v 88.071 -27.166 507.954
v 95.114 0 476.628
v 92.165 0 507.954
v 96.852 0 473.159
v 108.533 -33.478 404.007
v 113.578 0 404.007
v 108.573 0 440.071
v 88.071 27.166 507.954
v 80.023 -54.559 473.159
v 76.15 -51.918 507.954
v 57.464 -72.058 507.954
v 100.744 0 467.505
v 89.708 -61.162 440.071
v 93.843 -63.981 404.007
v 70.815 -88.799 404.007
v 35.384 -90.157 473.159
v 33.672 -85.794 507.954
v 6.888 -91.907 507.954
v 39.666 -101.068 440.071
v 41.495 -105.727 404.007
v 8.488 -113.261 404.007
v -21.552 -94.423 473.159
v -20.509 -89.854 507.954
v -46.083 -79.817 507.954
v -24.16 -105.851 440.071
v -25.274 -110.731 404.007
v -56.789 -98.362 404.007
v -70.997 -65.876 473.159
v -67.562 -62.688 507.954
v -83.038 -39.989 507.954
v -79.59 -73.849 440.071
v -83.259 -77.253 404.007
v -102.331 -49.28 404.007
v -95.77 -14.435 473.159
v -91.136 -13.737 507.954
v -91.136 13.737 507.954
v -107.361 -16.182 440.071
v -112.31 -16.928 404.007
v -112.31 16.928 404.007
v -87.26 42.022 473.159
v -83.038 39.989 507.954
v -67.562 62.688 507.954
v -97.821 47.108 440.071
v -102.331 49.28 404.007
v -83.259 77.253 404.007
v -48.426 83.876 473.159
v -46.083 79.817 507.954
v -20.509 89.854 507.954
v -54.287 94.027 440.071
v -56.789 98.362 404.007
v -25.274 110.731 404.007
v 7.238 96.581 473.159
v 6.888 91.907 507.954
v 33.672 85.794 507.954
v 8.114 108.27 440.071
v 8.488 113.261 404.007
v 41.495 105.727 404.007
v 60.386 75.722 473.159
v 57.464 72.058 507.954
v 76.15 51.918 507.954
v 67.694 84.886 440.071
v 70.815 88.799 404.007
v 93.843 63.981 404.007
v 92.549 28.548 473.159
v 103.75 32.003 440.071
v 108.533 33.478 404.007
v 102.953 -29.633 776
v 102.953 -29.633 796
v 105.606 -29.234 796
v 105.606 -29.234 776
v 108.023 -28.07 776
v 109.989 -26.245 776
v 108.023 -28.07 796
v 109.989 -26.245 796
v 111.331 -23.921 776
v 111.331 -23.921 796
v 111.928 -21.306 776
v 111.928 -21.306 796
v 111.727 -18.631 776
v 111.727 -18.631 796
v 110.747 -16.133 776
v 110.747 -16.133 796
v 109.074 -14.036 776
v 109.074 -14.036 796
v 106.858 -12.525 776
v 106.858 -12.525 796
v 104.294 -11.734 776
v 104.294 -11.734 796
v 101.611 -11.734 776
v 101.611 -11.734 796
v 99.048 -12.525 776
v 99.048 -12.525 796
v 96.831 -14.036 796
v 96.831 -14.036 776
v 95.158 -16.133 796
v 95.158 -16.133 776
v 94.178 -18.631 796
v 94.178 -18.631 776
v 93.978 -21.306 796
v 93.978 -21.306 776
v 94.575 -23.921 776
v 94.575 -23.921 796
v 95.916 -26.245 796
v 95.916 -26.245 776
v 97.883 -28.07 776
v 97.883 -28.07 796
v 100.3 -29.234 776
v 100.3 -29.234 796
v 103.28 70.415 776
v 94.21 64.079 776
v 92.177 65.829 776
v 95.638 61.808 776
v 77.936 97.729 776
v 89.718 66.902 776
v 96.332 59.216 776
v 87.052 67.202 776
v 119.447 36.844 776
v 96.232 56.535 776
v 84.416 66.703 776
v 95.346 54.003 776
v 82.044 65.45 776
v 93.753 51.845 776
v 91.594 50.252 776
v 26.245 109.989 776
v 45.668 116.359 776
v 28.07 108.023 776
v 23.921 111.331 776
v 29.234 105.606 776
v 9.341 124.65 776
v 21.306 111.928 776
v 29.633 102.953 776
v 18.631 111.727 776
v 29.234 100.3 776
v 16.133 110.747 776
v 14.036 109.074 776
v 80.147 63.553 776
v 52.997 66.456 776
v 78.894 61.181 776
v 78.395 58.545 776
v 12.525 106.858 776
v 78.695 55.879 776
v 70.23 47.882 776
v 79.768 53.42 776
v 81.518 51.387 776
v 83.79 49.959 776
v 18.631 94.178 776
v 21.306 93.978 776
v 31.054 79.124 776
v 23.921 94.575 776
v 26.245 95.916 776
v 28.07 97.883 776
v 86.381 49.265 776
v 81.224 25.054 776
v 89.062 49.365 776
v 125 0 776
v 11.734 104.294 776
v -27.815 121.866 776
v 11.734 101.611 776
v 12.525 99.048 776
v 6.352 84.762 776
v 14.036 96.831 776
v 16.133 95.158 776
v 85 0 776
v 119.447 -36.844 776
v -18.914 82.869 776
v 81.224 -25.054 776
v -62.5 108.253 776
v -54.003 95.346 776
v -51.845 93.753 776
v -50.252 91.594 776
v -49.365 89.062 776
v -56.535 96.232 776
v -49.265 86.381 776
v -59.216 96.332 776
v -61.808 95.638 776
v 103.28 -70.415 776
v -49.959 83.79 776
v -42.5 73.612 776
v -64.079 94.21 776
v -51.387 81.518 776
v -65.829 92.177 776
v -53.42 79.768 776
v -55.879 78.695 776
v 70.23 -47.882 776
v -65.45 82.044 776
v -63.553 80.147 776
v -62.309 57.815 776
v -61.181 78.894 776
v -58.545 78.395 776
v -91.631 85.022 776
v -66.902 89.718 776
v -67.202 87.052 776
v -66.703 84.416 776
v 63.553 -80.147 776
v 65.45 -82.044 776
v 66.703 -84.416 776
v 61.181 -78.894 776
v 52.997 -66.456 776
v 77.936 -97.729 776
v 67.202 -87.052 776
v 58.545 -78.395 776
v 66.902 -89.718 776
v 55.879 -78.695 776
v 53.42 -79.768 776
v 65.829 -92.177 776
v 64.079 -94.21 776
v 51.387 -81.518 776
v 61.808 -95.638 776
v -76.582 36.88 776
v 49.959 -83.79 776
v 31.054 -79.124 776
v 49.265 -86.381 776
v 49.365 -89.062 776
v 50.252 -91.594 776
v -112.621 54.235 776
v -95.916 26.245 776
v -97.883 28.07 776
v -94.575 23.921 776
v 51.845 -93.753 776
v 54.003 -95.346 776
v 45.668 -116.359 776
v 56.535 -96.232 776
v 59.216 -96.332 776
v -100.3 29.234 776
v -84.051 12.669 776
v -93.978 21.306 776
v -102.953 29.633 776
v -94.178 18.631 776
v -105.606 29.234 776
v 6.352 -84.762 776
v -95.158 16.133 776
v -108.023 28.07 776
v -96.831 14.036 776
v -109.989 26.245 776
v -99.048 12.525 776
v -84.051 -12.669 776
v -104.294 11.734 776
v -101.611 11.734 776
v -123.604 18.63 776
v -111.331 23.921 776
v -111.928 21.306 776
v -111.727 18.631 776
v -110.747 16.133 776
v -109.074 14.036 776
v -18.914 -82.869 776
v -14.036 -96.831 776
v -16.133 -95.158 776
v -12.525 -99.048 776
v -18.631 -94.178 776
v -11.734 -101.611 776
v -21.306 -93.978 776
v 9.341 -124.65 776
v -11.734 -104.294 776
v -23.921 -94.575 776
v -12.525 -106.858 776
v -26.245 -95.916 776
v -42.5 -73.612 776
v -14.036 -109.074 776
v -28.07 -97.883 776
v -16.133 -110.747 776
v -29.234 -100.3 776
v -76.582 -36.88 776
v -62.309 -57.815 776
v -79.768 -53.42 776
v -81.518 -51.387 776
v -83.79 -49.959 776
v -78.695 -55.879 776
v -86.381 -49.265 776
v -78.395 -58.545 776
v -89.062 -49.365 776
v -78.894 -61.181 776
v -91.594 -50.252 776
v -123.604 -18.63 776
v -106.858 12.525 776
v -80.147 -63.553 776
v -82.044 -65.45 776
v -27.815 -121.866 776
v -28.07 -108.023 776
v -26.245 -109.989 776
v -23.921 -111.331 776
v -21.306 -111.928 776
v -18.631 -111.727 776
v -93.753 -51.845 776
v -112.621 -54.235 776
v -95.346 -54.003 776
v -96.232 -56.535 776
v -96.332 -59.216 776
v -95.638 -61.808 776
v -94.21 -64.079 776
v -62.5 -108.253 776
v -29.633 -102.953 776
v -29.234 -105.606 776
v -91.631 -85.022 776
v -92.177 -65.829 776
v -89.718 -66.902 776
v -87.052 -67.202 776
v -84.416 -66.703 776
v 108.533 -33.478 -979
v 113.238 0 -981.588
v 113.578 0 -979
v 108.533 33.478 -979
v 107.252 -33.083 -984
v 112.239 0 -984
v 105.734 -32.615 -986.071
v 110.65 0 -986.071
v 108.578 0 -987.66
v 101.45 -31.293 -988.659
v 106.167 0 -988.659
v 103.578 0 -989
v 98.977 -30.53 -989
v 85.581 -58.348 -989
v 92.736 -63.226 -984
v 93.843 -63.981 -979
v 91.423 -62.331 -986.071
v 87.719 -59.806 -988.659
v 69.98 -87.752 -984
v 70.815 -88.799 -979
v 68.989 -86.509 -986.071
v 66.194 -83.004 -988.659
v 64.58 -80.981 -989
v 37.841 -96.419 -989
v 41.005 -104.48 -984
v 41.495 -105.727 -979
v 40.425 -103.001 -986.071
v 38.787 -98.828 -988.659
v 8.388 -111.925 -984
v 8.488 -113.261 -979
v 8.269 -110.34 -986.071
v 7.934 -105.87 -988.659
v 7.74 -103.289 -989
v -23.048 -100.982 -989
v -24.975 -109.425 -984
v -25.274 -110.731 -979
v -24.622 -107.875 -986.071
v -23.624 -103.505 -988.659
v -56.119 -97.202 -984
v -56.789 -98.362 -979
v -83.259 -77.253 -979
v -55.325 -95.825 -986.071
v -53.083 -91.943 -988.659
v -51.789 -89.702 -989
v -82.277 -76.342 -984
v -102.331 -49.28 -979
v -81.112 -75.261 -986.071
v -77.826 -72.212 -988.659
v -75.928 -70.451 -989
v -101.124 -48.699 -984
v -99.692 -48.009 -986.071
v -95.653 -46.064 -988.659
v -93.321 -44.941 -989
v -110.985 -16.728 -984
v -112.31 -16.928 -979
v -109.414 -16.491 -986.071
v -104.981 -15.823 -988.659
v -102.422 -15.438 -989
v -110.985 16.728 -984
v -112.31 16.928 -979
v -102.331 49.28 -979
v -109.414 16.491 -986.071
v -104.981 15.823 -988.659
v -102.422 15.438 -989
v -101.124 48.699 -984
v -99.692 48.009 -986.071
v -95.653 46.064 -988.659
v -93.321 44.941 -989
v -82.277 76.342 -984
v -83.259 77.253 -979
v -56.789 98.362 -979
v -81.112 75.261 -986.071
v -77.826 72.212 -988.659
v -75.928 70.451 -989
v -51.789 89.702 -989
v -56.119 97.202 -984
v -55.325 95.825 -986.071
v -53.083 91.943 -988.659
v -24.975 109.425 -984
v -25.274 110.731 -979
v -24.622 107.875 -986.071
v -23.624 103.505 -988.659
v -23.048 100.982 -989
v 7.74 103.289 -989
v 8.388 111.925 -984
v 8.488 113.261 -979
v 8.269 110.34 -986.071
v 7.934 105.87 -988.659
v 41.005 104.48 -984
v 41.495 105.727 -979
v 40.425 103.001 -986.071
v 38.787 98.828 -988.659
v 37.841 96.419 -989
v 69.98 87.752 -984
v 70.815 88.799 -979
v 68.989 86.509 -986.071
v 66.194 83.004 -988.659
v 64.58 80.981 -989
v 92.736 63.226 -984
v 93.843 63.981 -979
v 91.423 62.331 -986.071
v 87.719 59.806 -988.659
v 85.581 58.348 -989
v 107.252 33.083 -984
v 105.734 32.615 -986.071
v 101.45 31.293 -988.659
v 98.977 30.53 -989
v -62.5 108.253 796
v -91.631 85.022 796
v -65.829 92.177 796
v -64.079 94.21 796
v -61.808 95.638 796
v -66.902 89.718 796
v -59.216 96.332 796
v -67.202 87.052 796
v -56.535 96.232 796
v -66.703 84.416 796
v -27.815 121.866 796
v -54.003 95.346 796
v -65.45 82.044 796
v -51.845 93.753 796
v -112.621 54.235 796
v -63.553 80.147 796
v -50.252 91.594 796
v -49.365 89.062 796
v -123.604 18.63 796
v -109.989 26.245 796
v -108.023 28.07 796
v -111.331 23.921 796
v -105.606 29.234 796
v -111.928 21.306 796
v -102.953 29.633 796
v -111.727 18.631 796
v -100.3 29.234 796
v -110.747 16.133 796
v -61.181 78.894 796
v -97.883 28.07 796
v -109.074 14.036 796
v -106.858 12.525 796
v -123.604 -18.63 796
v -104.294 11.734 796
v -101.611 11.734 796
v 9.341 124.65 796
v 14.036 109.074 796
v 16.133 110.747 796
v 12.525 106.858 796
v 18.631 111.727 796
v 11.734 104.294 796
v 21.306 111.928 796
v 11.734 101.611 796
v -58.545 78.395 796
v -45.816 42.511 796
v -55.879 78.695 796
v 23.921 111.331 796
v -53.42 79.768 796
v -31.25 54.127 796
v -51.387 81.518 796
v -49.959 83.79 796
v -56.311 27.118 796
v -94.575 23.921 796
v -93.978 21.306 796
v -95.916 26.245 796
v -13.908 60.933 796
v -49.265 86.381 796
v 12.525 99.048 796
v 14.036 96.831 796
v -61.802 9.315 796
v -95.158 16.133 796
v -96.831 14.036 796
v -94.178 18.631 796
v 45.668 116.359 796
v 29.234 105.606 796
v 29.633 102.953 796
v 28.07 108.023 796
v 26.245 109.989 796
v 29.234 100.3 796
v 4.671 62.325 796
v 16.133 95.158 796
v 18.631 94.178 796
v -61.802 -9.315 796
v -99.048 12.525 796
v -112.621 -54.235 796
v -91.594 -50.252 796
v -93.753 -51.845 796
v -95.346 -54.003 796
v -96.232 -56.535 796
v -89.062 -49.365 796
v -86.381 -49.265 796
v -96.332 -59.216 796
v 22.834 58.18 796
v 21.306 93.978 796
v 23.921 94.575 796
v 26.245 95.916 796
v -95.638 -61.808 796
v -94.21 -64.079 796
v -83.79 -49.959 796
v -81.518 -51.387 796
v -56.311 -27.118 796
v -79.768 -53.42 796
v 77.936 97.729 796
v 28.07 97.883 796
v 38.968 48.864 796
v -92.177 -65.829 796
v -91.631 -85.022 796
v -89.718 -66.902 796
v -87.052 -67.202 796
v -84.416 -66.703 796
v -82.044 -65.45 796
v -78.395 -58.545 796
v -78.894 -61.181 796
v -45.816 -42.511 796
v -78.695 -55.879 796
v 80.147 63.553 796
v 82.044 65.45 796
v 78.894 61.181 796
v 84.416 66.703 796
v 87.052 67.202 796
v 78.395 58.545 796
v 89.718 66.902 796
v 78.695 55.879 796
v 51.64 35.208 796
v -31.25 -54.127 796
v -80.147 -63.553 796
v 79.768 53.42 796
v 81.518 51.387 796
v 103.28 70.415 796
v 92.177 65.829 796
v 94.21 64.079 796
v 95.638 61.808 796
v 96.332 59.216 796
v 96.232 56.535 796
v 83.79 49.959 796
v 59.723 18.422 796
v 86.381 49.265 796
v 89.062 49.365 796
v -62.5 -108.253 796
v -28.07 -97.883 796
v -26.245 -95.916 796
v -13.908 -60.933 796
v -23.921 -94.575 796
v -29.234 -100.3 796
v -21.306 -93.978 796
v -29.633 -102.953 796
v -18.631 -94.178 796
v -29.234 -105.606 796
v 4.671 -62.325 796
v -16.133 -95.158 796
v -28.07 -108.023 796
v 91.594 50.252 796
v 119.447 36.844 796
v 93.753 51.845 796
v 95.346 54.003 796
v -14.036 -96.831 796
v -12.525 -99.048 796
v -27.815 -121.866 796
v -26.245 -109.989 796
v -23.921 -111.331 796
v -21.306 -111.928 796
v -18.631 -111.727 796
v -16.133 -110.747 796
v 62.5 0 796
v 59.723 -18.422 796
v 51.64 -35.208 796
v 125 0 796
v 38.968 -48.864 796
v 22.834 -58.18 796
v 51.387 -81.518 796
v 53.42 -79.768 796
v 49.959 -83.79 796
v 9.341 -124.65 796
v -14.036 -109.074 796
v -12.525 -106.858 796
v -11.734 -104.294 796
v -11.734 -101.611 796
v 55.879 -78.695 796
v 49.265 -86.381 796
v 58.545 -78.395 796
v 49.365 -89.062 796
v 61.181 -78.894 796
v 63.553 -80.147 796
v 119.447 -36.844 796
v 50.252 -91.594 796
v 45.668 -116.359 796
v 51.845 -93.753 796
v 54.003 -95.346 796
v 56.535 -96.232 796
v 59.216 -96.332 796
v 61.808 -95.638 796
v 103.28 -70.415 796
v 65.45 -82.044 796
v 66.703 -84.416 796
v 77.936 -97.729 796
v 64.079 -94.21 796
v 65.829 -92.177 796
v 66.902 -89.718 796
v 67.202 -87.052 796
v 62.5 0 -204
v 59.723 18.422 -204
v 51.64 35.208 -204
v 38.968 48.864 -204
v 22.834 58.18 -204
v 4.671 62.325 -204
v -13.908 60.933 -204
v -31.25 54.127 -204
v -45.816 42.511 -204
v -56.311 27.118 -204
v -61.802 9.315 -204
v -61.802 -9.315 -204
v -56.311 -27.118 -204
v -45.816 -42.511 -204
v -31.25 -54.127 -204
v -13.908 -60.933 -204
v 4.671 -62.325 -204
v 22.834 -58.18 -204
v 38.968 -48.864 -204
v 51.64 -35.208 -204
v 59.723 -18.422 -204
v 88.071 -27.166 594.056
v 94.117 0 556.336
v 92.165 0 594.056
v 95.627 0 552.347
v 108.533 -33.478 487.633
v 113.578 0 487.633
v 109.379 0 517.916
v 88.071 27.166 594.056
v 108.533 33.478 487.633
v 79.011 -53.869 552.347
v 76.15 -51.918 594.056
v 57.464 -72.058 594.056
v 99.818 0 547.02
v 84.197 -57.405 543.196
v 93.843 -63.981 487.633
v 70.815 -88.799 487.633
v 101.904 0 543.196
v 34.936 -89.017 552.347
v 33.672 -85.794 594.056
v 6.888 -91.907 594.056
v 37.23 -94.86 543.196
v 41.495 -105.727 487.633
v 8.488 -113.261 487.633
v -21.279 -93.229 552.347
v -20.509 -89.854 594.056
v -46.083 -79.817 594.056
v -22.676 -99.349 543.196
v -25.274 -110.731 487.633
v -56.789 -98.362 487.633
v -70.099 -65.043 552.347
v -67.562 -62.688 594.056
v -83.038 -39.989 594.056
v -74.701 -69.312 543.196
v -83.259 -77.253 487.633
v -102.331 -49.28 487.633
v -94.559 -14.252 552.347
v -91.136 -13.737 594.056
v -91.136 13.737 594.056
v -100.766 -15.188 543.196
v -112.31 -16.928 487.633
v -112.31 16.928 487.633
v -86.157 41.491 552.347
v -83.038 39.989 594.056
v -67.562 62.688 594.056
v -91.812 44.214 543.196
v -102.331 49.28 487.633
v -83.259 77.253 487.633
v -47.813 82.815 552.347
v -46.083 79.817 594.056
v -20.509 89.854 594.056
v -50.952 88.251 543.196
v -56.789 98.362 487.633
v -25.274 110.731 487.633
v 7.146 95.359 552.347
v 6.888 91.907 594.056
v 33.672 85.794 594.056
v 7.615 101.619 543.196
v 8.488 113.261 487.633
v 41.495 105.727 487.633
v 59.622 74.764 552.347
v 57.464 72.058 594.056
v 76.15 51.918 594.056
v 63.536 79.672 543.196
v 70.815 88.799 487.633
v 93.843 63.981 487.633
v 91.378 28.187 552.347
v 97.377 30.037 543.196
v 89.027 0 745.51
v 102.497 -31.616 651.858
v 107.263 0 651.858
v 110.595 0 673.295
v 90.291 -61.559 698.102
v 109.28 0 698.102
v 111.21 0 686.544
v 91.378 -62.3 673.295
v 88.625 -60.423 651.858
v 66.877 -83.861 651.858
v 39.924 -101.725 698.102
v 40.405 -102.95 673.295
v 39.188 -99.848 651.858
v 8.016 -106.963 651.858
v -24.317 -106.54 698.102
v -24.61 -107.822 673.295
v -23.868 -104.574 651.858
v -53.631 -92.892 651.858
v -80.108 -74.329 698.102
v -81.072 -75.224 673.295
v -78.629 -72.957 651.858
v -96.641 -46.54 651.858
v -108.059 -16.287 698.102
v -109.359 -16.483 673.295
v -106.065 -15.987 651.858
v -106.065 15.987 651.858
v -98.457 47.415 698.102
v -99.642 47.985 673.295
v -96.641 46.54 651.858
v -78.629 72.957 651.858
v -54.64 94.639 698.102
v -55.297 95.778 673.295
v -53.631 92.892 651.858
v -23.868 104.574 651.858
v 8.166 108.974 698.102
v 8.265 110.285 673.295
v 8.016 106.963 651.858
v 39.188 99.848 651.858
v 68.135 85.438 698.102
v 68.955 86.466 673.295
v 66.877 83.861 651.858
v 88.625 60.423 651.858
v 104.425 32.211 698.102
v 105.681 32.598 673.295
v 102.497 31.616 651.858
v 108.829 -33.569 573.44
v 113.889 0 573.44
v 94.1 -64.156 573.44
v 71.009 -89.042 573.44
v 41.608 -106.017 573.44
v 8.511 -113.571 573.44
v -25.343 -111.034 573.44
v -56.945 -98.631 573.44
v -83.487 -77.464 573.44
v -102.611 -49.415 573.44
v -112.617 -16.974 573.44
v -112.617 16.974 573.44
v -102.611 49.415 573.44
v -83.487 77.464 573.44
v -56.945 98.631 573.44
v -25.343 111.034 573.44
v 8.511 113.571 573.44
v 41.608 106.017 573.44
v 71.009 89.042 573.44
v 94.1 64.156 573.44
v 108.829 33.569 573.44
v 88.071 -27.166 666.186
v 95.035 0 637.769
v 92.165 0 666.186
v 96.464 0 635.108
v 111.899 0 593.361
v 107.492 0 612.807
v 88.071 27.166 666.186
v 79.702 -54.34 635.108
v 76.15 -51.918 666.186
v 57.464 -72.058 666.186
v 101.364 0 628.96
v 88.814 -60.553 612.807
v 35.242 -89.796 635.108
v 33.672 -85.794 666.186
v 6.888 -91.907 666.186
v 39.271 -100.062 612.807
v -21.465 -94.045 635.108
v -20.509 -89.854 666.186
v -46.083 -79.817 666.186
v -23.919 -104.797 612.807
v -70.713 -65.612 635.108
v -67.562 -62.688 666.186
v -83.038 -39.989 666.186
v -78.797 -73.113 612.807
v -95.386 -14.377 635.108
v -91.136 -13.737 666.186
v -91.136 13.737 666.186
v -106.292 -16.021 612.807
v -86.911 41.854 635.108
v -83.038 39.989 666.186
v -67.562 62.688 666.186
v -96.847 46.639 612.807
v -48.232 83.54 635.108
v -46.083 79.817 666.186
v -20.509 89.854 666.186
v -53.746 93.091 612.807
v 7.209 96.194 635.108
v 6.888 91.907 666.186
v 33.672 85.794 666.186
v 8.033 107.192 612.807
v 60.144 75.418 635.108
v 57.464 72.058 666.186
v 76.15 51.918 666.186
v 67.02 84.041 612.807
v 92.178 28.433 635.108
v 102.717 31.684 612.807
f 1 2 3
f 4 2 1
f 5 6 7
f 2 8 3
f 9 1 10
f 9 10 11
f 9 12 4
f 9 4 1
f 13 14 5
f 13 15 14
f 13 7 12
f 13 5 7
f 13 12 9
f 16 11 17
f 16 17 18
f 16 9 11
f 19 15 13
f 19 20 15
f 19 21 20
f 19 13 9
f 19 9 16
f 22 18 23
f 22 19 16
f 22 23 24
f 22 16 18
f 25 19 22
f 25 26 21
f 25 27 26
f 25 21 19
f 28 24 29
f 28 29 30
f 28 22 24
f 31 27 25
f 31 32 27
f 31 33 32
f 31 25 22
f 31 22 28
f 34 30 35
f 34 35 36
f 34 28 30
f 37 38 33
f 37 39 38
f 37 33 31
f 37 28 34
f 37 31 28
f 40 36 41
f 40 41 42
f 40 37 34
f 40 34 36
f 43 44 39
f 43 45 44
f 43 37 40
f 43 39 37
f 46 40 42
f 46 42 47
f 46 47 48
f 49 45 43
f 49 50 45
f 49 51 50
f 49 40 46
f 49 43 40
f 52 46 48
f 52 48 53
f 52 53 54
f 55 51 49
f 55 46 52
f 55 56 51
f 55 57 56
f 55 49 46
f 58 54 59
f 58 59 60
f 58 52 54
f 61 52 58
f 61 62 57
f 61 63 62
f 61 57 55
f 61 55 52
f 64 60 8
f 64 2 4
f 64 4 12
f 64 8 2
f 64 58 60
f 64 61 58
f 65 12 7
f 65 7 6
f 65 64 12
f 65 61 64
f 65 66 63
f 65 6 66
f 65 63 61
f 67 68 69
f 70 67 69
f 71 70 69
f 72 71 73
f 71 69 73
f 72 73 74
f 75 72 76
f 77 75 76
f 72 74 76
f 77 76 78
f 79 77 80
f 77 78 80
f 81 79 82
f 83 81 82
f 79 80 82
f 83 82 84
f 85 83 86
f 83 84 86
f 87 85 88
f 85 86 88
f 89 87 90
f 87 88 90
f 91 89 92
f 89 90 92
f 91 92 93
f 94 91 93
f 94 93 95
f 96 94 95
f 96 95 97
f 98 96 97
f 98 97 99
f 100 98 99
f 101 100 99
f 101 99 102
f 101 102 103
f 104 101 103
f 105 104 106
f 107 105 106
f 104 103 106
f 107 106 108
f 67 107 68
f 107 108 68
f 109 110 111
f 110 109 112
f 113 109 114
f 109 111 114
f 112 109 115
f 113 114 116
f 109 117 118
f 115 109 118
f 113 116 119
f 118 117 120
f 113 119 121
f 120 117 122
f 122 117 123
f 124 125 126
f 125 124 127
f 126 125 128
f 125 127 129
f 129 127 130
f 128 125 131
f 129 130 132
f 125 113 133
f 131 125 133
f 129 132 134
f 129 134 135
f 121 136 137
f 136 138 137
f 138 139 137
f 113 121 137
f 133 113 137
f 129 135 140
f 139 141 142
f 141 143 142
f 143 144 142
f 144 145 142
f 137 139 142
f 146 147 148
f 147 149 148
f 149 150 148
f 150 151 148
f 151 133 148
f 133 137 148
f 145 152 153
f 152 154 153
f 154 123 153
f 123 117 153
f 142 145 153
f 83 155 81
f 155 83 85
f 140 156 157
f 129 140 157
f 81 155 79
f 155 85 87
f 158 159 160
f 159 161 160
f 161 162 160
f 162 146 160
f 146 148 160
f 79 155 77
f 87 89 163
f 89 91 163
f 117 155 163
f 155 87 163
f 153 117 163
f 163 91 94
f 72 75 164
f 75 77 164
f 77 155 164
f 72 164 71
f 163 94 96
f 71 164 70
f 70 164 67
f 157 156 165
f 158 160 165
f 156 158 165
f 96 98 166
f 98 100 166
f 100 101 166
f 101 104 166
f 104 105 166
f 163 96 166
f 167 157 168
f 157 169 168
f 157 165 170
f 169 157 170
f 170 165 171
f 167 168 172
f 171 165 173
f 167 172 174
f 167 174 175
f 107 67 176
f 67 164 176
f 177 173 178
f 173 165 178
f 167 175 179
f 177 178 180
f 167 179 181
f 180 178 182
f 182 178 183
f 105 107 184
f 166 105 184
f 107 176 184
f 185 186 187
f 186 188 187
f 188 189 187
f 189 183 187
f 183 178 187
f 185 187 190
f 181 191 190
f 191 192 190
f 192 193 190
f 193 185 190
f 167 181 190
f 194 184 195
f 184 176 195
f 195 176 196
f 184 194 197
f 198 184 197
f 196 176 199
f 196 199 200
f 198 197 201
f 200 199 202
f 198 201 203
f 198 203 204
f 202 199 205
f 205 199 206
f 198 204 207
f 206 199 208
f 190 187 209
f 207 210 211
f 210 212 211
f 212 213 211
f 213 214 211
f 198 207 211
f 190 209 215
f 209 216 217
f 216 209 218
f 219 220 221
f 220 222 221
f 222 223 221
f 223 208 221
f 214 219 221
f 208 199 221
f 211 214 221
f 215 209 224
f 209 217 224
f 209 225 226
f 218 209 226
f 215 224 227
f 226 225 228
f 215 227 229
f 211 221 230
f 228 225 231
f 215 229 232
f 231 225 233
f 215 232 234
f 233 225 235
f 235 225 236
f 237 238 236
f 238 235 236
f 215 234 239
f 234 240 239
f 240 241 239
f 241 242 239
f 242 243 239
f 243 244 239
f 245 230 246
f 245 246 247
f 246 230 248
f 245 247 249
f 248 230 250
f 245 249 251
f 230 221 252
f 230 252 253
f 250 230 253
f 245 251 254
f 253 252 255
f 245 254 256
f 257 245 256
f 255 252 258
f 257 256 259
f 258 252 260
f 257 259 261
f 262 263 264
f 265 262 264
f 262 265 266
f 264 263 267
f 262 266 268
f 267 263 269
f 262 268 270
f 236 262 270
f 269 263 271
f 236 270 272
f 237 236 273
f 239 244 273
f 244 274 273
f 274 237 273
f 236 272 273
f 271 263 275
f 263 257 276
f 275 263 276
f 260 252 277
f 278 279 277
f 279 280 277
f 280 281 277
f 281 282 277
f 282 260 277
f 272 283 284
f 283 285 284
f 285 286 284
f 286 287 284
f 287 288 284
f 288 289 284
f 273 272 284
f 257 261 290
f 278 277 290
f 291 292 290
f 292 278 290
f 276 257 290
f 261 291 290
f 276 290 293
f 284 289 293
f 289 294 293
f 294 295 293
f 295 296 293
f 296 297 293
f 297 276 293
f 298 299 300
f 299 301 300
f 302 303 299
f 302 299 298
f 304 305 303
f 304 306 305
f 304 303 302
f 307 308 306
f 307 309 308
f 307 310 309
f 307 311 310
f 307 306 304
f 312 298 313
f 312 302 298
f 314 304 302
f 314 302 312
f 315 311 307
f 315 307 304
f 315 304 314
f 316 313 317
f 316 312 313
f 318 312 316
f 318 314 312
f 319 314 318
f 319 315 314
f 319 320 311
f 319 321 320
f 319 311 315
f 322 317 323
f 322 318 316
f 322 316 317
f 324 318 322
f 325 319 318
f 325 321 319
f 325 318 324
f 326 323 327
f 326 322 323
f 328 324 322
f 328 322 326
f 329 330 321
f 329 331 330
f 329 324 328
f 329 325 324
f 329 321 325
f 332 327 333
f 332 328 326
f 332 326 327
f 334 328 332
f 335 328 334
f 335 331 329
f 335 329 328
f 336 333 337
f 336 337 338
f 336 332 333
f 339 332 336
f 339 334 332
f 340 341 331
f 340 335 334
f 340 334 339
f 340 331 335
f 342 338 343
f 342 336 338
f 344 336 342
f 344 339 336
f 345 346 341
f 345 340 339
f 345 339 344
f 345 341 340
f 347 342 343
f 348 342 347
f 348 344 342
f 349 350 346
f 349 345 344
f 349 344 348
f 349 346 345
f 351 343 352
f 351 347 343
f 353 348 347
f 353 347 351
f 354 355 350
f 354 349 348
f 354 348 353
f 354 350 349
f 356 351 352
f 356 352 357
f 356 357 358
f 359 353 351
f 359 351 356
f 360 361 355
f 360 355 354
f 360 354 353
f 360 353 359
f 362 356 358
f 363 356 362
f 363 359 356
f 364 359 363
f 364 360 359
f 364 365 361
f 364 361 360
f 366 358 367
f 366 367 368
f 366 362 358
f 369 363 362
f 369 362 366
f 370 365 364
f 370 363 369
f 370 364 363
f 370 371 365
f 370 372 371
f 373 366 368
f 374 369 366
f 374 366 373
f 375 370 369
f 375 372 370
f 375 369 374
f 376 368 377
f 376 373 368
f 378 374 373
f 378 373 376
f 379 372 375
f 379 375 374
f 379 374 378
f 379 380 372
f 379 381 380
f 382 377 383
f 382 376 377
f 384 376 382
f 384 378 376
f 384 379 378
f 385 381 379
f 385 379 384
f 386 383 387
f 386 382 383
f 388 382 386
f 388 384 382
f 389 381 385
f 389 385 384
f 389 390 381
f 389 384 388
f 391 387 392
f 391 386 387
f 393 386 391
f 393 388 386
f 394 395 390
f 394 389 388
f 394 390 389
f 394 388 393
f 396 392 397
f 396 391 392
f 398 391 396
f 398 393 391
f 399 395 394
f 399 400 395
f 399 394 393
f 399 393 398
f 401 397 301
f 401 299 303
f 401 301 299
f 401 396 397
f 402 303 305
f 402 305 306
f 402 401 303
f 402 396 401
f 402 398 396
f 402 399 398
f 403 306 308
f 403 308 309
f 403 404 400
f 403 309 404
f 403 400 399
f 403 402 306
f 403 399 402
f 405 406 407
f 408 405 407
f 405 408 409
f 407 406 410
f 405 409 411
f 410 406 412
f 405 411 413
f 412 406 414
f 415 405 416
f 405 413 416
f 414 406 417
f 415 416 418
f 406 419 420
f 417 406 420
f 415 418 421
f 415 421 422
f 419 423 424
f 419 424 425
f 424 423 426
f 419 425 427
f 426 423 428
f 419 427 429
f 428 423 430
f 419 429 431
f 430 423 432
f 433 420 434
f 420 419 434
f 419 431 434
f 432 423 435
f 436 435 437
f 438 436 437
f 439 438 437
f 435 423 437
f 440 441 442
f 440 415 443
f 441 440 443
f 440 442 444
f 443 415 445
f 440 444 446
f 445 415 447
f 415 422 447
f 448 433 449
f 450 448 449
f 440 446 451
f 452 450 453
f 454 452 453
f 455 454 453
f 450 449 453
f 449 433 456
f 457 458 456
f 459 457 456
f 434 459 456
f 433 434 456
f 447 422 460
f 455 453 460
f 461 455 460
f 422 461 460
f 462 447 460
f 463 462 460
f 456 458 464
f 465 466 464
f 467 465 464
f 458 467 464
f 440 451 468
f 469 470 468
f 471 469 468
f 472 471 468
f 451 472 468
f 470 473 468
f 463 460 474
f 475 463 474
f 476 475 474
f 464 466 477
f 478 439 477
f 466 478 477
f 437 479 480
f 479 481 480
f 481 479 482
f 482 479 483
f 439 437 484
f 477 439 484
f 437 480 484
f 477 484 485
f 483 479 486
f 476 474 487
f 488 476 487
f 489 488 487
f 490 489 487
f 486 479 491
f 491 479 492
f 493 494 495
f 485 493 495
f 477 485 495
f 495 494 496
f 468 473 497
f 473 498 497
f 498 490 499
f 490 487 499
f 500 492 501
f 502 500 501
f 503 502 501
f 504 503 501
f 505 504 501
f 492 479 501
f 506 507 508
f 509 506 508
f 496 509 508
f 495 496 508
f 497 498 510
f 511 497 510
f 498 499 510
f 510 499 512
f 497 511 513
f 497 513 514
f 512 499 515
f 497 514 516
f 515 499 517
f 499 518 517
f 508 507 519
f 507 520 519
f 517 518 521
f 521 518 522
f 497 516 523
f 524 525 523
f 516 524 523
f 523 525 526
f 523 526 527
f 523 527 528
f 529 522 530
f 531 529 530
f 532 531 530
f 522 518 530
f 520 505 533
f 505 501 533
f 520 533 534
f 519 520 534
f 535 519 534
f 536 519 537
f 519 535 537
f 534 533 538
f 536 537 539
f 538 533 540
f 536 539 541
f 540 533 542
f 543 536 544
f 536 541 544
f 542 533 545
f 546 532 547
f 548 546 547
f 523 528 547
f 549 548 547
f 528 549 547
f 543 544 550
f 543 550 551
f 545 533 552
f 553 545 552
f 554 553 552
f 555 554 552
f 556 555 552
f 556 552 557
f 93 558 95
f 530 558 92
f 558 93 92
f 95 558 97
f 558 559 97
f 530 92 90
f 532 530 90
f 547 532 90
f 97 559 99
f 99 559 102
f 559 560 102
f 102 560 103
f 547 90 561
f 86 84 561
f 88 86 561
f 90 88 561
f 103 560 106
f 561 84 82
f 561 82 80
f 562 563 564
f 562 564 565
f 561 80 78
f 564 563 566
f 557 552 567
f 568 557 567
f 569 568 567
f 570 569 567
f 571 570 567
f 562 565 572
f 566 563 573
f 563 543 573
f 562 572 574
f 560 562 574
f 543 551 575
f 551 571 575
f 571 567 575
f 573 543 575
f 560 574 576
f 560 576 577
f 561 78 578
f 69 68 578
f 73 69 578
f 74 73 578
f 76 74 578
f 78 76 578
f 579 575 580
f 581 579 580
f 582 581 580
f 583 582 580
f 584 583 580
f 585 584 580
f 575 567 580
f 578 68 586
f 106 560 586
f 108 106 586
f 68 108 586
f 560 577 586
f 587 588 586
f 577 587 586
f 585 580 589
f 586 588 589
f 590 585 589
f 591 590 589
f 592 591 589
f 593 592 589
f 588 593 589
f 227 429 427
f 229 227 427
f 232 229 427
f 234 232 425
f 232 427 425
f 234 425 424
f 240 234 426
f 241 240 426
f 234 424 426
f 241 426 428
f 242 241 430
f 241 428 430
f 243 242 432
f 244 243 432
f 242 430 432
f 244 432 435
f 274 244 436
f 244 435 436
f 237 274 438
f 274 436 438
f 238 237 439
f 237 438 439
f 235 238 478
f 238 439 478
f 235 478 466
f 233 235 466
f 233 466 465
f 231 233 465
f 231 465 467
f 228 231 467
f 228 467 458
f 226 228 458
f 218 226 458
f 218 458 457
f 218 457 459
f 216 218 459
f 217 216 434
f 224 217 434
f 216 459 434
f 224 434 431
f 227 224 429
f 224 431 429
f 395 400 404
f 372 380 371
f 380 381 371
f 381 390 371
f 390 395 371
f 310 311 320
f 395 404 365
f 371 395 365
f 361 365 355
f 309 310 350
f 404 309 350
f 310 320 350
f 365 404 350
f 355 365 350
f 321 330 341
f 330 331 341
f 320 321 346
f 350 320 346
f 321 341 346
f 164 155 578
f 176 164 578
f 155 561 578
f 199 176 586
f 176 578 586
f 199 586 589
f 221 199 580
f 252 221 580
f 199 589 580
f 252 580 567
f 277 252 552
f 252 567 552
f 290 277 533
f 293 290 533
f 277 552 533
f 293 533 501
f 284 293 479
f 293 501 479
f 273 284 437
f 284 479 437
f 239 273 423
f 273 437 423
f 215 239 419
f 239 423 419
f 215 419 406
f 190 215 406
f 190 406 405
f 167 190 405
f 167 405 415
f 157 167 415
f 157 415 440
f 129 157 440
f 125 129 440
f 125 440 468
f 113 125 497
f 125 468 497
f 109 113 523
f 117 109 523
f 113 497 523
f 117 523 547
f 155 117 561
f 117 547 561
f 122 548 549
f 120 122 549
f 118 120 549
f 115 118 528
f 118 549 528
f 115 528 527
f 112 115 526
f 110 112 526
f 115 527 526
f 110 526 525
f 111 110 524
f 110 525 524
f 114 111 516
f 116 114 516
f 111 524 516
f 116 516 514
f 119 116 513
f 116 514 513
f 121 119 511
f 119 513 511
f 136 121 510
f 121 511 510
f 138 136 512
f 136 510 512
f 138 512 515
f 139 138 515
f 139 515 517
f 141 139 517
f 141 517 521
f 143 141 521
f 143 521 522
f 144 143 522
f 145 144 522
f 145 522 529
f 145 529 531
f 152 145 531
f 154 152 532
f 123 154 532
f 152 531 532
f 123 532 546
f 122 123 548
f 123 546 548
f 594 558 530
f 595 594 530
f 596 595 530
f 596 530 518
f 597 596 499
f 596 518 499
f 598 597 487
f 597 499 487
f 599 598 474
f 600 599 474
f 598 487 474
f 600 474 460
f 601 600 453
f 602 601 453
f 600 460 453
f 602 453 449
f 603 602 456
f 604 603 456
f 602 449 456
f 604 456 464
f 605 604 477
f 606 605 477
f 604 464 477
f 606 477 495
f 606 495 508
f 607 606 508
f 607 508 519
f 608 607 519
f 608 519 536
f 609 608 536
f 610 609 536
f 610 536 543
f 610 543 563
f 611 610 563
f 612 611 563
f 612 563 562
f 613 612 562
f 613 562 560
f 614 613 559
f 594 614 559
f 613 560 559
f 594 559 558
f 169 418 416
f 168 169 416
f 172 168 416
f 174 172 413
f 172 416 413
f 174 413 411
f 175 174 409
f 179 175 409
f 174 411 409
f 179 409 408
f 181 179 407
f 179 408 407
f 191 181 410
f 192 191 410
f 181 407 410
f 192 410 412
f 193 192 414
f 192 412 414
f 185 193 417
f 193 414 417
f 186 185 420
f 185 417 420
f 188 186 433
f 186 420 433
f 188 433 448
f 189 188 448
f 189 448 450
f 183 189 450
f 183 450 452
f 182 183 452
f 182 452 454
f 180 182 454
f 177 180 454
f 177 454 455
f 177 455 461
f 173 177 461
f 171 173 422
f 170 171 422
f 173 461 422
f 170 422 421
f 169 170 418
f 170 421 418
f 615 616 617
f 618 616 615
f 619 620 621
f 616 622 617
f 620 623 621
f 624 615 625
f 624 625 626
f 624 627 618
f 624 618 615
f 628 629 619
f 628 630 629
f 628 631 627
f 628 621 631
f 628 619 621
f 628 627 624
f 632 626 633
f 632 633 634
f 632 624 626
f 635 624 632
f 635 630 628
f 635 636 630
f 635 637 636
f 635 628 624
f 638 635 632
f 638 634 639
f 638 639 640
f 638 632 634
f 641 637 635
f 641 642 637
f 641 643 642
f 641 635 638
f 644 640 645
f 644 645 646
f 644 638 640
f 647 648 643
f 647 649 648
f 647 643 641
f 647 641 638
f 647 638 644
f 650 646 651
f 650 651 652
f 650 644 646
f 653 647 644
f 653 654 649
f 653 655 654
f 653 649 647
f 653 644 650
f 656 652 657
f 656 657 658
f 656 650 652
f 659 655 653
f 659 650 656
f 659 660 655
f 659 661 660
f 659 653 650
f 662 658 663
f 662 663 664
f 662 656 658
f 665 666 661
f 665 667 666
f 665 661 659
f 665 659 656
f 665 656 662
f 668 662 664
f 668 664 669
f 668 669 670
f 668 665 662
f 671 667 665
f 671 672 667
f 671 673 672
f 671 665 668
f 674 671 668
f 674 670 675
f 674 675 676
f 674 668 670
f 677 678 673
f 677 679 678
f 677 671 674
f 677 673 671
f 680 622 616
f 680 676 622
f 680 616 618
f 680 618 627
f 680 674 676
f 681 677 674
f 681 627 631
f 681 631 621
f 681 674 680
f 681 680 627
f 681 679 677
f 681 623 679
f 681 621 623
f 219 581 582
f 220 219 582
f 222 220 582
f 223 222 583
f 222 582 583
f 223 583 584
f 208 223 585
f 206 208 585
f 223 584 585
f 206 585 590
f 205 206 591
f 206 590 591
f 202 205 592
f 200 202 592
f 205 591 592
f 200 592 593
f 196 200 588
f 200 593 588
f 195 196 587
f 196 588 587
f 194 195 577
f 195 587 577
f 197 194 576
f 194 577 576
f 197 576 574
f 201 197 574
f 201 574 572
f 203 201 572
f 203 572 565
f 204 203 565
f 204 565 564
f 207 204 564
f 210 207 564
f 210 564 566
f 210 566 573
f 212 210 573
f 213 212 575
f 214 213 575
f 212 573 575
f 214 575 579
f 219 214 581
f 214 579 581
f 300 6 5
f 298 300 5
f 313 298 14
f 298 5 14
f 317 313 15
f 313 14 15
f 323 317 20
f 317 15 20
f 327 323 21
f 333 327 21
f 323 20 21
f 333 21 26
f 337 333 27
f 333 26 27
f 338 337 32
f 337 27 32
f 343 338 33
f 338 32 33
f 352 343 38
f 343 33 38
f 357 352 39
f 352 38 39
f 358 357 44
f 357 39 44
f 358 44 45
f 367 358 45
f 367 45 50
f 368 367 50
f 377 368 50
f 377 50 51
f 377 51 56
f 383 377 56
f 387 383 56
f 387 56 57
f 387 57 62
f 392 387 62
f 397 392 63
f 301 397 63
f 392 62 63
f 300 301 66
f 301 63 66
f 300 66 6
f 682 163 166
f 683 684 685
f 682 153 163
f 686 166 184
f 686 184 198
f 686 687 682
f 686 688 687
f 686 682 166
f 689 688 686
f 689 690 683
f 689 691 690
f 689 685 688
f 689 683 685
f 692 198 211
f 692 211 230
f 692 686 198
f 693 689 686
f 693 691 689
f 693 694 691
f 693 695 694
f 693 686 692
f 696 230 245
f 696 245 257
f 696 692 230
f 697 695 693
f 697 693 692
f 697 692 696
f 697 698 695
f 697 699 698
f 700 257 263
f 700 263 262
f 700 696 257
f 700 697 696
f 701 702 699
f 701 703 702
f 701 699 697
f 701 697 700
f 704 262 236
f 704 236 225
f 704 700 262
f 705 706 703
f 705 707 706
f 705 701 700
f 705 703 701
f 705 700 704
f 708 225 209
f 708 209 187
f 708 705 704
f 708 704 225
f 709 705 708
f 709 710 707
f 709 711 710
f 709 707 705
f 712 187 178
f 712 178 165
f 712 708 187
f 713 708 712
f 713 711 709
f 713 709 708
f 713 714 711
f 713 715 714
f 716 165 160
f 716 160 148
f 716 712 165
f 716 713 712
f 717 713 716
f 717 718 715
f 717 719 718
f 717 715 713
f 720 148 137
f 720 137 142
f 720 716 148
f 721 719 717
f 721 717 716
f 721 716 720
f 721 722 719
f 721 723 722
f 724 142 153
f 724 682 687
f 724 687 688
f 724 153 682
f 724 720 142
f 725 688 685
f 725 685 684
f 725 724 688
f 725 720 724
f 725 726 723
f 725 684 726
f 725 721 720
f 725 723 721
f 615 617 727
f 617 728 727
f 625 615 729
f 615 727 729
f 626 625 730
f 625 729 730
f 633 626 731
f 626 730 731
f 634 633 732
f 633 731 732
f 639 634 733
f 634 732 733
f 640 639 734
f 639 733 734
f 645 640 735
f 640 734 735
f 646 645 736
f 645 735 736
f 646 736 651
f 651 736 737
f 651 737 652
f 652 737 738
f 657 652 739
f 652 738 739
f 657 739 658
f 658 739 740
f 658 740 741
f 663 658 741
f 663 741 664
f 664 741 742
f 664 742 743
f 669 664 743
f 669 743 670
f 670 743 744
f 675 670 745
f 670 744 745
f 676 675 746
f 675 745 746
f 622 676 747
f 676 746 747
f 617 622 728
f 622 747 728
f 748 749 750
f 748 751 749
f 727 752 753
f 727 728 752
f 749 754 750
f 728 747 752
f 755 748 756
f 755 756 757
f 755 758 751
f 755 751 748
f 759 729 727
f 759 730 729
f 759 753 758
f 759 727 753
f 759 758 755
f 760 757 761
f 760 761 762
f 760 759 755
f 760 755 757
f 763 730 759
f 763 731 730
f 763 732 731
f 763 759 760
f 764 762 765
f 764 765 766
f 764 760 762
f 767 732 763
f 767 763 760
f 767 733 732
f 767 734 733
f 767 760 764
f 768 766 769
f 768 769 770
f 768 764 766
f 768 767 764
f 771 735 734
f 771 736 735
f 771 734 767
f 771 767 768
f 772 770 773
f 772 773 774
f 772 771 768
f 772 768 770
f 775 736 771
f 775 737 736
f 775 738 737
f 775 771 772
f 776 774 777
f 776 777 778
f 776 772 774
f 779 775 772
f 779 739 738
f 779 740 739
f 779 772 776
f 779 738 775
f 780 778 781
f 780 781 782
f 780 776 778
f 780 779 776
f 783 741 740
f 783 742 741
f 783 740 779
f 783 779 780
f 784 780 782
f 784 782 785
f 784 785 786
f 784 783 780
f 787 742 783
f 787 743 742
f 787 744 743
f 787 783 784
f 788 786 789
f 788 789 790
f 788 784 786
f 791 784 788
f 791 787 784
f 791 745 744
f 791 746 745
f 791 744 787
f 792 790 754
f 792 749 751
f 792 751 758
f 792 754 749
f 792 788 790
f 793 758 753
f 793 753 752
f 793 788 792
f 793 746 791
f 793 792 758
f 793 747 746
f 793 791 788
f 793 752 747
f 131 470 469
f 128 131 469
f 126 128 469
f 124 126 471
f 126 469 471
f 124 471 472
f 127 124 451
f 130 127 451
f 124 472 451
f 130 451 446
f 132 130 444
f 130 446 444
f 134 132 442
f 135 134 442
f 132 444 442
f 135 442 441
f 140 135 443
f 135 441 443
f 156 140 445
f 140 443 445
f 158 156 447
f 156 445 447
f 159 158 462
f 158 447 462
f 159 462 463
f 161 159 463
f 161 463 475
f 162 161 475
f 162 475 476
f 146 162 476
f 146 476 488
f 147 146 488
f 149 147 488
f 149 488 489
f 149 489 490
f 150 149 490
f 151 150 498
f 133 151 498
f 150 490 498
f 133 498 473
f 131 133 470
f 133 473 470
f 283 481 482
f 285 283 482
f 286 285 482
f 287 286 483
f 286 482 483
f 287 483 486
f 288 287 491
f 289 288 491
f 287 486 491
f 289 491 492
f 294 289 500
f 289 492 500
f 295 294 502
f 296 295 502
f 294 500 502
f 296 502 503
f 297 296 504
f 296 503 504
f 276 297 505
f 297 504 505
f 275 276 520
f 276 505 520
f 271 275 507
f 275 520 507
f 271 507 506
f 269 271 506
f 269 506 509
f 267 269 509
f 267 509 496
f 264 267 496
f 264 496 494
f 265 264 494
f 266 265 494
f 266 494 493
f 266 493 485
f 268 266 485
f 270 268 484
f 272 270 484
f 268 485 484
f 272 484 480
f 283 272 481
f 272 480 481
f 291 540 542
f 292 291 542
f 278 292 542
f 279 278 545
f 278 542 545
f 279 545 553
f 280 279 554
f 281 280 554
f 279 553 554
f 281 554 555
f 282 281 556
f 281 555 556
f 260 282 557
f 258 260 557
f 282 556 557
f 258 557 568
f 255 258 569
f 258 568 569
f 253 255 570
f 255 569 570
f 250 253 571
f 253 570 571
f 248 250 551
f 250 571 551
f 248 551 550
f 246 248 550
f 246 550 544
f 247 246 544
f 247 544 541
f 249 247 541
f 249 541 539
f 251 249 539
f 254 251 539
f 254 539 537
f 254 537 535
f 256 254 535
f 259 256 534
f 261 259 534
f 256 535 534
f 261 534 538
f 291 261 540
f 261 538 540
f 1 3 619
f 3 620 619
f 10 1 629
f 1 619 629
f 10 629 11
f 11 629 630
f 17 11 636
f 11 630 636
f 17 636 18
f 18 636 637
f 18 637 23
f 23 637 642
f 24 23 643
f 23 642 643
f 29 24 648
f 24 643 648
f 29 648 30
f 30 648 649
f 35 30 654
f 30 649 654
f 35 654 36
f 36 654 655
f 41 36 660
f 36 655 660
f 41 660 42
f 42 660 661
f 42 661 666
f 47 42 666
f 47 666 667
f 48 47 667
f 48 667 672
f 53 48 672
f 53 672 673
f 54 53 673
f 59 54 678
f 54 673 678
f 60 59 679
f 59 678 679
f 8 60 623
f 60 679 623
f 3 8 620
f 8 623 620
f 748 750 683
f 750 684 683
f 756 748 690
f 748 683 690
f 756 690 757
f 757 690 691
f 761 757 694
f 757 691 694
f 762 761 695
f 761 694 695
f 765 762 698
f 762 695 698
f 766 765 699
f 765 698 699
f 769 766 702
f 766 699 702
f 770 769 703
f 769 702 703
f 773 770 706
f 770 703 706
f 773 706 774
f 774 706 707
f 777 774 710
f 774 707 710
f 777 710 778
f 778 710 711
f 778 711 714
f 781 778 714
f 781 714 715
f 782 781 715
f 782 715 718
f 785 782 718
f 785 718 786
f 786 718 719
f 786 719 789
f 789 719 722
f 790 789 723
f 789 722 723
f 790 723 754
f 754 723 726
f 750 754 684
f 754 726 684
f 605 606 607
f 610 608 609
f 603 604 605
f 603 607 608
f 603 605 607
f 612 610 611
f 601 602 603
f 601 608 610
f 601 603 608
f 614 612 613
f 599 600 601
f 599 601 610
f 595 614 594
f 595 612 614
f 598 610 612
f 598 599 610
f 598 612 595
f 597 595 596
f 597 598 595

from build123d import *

# Parameters (mm, degrees)
F2_R            = 9
F3_DEPTH        = 20
F3_COPIES_COUNT = 8
F4_R            = 62.5
F5_DEPTH        = 1000
F6_R            = 10


# Not quite as in the source:
# - a pattern or mirror of a feature is missing from the dataset's text; its kind, count and spacing are read off the source's solid
# - a feature names something its author has since deleted; it is built from what else it names


with BuildPart() as f1:
    # F0 (on Front) → F1 (revolve)
    with BuildSketch(Plane.XZ):
        with BuildLine():
            Line((125, 796), (0, 796))
            Line((0, 796), (0, -989))
            Line((0, -989), (113.5784983635, -989))
            Line((113.5784983635, -989), (113.5784983635, 404.0072858334))
            add(Edge.make_bspline(
                [(92.1651435272, 507.9540014267), (92.9137259621, 470.1226269606), (100.84153647, 482.9142285433), (112.1166527424, 426.1022583198), (113.5784983635, 404.0072858334)],
                knots=[0, 0, 0, 0, 0.4424634244, 1, 1, 1, 1], degree=3))
            Line((92.1651435272, 507.9540014267), (113.5784983635, 487.6332684117))
            add(Edge.make_bspline(
                [(92.1651435272, 594.0558493723), (91.8360996428, 546.4974648718), (99.9002877175, 562.9049137477), (112.740117412, 507.2303715025), (113.5784983635, 487.6332684117)],
                knots=[0, 0, 0, 0, 0.4754834111, 1, 1, 1, 1], degree=3))
            Line((92.1651435272, 594.0558493723), (113.8892782108, 573.4401941299))
            add(Edge.make_bspline(
                [(92.1651435272, 666.1855578423), (92.9649518715, 631.6504081509), (100.208934103, 643.7752292593), (113.5784983635, 594.0558493723), (113.8892782108, 573.4401941299)],
                knots=[0, 0, 0, 0, 0.4429655486, 1, 1, 1, 1], degree=3))
            Line((92.1651435272, 666.1855578423), (107.2628746321, 651.8581922678))
            add(Edge.make_bspline(
                [(85, 776), (85.5159944694, 765.5527371234), (86.1594088799, 739.9492330129), (118.4720692878, 693.8768537198), (108.213278463, 662.5958632515), (107.2628746321, 651.8581922678)],
                knots=[0, 0, 0, 0, 0.3013801818, 0.6765769995, 1, 1, 1, 1], degree=3))
            Line((85, 776), (125, 776))
            Line((125, 776), (125, 796))
        make_face()
    revolve(axis=Axis((0, 0, -102), (0, 0, -1)))

    # F2 (on face) → F3 (cut, through all)
    with BuildSketch(Plane.XY.offset(796)):
        with Locations((20.6334079429, 102.9527196176)):
            Circle(F2_R)
    f3 = extrude(amount=-F3_DEPTH, mode=Mode.SUBTRACT)

    # F3_copies: F3 ×8 about axis
    f3_copies_axis = Axis((0, 0, 0), (0, 0, 1))
    for i in range(1, F3_COPIES_COUNT):
        add(f3.rotate(f3_copies_axis, i * 360 / F3_COPIES_COUNT), mode=Mode.SUBTRACT)

    # F4 (on face) → F5 (cut)
    with BuildSketch(Plane.XY.offset(796)):
        Circle(F4_R)
    extrude(amount=-F5_DEPTH, mode=Mode.SUBTRACT)

    # F6
    f6_edges = [f1.edges().sort_by_distance(p)[0] for p in [
        (-113.578498, 0, -989),
    ]]
    fillet(f6_edges, radius=F6_R)


solid = f1.part
